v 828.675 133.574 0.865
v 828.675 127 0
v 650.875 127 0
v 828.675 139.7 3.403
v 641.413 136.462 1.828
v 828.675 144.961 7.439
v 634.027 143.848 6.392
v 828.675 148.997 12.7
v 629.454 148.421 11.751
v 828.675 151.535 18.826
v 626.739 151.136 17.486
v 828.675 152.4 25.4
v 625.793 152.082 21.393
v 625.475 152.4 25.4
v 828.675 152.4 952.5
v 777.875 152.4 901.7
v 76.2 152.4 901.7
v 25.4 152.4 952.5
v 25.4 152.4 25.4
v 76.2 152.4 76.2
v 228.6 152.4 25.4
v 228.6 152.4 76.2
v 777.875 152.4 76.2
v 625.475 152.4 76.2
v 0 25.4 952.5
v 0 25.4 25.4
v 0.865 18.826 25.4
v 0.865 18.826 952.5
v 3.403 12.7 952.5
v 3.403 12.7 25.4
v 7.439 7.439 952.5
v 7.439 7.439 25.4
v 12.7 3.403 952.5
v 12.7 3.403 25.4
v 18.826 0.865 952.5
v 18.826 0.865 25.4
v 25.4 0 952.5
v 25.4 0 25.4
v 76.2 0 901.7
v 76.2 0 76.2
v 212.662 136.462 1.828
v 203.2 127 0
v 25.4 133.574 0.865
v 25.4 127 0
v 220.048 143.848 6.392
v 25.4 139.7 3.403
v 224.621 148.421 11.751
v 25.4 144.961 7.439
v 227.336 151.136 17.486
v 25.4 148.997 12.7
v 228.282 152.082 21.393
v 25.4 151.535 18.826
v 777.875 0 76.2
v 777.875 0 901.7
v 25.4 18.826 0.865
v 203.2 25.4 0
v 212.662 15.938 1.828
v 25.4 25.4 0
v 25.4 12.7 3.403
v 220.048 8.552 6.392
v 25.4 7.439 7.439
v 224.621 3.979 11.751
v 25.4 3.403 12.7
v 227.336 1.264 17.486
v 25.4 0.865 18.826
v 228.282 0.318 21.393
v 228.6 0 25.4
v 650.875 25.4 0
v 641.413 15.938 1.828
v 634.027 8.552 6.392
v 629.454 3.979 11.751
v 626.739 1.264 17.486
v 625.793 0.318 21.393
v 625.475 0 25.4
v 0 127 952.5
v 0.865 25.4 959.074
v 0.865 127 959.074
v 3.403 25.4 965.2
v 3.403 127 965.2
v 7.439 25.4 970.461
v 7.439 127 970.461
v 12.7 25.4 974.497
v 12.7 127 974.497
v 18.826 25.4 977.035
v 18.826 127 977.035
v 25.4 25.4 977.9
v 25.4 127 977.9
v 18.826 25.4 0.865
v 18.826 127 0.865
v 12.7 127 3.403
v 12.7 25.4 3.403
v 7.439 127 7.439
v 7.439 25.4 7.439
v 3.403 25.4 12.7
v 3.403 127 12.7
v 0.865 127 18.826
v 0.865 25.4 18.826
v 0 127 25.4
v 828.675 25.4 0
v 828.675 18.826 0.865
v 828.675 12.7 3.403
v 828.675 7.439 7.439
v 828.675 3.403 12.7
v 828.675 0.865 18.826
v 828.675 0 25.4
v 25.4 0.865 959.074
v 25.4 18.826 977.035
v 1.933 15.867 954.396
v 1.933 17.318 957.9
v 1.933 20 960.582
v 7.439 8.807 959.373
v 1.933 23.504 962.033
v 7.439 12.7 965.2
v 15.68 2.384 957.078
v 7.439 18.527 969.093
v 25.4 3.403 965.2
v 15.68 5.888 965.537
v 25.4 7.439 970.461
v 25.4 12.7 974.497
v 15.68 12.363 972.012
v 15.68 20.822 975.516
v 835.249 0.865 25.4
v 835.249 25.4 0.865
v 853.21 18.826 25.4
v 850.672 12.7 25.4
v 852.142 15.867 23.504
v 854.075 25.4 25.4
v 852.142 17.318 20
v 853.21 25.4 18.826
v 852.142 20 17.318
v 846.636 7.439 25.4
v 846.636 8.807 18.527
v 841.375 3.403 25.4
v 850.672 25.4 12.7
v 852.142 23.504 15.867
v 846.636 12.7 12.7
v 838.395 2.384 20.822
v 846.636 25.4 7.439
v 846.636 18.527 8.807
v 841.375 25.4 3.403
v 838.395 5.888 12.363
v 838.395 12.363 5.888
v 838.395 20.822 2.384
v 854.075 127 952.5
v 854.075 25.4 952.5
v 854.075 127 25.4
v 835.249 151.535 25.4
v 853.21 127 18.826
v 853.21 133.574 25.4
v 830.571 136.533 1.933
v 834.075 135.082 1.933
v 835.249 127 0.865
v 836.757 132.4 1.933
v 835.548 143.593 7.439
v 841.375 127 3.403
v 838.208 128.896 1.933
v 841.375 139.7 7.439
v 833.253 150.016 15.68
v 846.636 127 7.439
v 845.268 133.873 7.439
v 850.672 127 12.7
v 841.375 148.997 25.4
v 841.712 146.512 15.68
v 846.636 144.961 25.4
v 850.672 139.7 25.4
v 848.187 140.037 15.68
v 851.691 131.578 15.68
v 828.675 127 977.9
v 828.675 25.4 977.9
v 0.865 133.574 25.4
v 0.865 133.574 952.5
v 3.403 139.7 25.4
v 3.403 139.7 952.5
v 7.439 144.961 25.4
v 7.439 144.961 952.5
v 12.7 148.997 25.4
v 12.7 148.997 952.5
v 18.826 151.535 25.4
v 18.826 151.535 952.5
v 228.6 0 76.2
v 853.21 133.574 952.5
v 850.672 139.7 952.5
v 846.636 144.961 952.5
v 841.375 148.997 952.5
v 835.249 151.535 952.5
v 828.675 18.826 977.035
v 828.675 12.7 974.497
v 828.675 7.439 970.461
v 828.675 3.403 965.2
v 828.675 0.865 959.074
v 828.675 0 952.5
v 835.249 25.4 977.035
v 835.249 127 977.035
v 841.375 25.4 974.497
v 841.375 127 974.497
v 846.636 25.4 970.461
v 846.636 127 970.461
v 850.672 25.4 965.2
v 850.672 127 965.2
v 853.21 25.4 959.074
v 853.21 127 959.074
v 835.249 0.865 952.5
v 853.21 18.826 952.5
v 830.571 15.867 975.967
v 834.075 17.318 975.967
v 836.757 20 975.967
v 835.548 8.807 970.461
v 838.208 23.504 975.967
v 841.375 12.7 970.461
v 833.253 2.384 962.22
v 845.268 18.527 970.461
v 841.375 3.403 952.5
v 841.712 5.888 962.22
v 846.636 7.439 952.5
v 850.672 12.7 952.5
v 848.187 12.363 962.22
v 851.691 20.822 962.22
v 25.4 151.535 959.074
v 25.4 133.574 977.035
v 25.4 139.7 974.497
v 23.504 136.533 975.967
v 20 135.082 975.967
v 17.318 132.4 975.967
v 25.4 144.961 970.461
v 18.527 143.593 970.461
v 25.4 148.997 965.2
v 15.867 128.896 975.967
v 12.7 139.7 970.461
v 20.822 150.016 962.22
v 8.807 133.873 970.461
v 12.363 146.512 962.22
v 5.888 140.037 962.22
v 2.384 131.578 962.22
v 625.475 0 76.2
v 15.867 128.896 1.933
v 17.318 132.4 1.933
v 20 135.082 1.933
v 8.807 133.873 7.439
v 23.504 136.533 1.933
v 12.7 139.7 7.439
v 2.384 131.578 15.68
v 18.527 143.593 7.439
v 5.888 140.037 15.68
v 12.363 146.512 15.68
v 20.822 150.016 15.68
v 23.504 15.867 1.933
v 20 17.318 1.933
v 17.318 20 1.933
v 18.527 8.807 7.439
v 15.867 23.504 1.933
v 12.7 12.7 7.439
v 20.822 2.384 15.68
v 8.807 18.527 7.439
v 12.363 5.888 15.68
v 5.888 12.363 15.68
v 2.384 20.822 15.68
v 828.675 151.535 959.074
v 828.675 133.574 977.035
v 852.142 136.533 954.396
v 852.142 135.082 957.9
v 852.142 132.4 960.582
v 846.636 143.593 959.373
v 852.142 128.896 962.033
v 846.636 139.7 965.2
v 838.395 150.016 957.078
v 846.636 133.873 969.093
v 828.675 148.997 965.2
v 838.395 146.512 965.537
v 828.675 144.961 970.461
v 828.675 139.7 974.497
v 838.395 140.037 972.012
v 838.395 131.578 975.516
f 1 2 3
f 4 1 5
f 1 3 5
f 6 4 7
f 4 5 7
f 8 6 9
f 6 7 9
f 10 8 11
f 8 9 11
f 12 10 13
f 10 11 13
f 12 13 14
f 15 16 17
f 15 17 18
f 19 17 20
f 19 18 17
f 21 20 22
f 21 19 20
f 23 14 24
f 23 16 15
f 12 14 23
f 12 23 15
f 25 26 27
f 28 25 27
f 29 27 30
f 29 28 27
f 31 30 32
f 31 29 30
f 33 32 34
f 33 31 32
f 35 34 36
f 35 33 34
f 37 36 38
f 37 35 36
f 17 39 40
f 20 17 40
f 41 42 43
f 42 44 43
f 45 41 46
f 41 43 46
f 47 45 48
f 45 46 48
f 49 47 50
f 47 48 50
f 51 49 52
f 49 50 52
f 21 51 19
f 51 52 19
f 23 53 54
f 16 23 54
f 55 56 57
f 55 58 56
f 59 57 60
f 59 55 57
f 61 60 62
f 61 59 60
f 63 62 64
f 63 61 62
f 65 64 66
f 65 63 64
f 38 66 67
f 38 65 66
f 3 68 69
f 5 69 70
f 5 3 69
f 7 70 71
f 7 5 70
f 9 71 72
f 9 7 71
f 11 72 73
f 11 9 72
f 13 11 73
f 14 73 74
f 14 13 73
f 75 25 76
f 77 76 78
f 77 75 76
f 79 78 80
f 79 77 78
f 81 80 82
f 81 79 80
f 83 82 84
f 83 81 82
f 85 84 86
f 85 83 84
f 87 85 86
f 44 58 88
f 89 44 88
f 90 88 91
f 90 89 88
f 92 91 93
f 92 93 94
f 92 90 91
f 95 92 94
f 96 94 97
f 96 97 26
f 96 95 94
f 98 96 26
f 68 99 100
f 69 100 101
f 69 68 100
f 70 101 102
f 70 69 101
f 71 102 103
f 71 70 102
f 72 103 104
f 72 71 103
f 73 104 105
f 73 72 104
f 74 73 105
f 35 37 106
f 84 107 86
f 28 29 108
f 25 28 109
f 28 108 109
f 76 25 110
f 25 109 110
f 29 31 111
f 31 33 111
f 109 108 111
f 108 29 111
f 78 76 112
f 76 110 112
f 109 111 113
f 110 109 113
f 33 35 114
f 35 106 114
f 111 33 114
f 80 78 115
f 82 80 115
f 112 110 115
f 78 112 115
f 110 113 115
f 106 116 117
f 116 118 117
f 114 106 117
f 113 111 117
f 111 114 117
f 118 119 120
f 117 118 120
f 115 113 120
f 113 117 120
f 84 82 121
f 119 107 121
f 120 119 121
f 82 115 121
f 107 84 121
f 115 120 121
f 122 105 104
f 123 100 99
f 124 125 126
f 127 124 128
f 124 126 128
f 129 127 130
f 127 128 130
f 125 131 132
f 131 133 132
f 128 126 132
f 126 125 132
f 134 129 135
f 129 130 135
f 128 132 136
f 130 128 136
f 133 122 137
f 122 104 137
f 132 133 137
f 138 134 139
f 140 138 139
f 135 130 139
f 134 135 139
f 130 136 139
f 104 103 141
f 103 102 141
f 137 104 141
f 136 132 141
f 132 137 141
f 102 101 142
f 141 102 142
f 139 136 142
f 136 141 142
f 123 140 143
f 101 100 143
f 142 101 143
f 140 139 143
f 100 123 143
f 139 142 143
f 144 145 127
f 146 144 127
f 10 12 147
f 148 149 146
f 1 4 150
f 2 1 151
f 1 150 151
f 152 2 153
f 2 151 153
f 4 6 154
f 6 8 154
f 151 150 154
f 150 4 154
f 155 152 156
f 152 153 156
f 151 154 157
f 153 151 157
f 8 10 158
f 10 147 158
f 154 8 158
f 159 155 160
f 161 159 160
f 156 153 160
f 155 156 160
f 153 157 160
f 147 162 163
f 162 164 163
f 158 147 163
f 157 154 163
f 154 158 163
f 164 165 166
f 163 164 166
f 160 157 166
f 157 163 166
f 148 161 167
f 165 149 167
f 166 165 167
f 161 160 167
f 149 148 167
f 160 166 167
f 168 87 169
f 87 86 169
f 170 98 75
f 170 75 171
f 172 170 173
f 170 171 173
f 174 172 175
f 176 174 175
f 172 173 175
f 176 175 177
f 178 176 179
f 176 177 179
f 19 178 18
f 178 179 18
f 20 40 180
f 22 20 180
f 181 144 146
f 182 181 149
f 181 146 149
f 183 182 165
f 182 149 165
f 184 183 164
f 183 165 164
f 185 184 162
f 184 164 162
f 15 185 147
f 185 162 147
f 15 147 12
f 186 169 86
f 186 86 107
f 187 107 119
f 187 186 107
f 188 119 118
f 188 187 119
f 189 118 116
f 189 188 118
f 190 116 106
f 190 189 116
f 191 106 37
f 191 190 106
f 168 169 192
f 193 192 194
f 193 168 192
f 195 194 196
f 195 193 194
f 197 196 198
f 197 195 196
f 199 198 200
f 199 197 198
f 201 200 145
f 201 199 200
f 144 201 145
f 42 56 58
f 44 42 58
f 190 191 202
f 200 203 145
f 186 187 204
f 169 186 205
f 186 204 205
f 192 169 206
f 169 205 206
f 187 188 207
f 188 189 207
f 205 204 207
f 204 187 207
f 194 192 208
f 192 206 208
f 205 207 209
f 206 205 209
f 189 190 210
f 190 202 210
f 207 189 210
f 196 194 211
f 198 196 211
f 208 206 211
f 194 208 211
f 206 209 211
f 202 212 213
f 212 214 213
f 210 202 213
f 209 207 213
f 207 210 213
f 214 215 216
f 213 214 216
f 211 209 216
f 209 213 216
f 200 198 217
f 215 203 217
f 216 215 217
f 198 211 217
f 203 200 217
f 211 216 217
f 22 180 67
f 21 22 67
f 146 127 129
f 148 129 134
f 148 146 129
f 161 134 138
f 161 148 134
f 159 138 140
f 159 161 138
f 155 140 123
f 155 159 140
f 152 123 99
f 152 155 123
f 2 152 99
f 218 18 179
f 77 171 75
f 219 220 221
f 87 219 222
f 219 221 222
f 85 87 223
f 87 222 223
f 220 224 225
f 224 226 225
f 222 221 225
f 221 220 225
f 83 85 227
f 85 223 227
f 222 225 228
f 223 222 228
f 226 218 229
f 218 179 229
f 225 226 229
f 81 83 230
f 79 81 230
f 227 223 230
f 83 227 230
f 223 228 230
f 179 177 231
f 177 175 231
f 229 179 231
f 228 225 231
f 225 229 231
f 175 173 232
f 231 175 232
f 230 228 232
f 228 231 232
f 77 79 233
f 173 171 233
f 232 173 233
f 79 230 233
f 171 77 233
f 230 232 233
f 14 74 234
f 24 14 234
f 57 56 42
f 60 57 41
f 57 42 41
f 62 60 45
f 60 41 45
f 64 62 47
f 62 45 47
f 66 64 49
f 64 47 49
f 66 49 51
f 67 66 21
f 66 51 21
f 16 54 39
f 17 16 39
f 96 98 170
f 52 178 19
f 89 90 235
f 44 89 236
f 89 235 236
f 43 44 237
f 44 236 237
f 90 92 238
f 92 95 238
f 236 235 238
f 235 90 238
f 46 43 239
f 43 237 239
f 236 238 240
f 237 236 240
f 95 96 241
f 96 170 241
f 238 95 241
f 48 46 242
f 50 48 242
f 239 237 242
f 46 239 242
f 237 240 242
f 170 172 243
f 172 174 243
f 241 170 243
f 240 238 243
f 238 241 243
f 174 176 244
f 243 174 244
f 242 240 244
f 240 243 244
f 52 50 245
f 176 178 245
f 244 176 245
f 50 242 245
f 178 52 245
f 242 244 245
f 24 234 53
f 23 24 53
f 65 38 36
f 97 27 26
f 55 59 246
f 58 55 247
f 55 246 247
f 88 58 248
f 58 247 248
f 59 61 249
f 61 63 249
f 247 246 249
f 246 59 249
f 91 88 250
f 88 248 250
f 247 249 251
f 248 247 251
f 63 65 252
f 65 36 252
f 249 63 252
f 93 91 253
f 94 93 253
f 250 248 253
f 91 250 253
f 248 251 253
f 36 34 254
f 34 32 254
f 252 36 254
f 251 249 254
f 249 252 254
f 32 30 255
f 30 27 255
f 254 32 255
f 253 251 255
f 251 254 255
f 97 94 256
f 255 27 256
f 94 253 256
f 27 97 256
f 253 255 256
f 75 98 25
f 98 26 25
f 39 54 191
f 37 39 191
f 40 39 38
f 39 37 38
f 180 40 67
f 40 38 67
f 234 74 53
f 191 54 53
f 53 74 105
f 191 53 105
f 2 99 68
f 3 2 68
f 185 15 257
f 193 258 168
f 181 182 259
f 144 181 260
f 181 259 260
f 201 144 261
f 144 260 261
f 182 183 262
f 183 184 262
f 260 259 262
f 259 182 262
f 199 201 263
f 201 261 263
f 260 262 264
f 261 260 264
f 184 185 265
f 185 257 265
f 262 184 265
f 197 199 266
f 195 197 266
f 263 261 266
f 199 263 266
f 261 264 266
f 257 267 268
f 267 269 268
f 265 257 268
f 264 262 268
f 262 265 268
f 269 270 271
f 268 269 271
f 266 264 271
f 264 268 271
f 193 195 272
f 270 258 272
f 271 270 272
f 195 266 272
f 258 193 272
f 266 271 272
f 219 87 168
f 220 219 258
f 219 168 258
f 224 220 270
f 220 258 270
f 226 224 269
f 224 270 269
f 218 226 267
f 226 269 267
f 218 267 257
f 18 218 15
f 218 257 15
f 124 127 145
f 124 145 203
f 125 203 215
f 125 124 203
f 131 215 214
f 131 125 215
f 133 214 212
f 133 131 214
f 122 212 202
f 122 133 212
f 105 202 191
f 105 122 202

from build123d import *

# Parameters (mm, degrees)
BOSS_EXTRUDE1_DEPTH = 152.4
FILLET1_R           = 25.4


with BuildPart() as part:
    # Sketch1 → Boss-Extrude1 (new body)
    with BuildSketch(Plane(origin=(0, 0, 0), x_dir=(1, 0, 0), z_dir=(0, 1, 0))):
        Polygon((228.6, 0), (0, 0), (0, -977.9), (854.075, -977.9), (854.075, 0), (625.475, 0), (625.475, -76.2), (777.875, -76.2), (777.875, -901.7), (76.2, -901.7), (76.2, -76.2), (228.6, -76.2), align=None)
    extrude(amount=BOSS_EXTRUDE1_DEPTH)

    # Fillet1
    fillet1_edges = [part.edges().sort_by_distance(p)[0] for p in [
        (0, 152.4, 488.95),
        (427.0375, 152.4, 977.9),
        (739.775, 0, 0),
        (854.075, 0, 488.95),
        (427.0375, 0, 977.9),
        (0, 0, 488.95),
        (114.3, 0, 0),
        (854.075, 152.4, 488.95),
        (739.775, 152.4, 0),
        (625.475, 76.2, 0),
        (854.075, 76.2, 0),
        (854.075, 76.2, 977.9),
        (0, 76.2, 977.9),
        (0, 76.2, 0),
        (228.6, 76.2, 0),
        (114.3, 152.4, 0),
    ]]
    fillet(fillet1_edges, radius=FILLET1_R)


solid = part.part
